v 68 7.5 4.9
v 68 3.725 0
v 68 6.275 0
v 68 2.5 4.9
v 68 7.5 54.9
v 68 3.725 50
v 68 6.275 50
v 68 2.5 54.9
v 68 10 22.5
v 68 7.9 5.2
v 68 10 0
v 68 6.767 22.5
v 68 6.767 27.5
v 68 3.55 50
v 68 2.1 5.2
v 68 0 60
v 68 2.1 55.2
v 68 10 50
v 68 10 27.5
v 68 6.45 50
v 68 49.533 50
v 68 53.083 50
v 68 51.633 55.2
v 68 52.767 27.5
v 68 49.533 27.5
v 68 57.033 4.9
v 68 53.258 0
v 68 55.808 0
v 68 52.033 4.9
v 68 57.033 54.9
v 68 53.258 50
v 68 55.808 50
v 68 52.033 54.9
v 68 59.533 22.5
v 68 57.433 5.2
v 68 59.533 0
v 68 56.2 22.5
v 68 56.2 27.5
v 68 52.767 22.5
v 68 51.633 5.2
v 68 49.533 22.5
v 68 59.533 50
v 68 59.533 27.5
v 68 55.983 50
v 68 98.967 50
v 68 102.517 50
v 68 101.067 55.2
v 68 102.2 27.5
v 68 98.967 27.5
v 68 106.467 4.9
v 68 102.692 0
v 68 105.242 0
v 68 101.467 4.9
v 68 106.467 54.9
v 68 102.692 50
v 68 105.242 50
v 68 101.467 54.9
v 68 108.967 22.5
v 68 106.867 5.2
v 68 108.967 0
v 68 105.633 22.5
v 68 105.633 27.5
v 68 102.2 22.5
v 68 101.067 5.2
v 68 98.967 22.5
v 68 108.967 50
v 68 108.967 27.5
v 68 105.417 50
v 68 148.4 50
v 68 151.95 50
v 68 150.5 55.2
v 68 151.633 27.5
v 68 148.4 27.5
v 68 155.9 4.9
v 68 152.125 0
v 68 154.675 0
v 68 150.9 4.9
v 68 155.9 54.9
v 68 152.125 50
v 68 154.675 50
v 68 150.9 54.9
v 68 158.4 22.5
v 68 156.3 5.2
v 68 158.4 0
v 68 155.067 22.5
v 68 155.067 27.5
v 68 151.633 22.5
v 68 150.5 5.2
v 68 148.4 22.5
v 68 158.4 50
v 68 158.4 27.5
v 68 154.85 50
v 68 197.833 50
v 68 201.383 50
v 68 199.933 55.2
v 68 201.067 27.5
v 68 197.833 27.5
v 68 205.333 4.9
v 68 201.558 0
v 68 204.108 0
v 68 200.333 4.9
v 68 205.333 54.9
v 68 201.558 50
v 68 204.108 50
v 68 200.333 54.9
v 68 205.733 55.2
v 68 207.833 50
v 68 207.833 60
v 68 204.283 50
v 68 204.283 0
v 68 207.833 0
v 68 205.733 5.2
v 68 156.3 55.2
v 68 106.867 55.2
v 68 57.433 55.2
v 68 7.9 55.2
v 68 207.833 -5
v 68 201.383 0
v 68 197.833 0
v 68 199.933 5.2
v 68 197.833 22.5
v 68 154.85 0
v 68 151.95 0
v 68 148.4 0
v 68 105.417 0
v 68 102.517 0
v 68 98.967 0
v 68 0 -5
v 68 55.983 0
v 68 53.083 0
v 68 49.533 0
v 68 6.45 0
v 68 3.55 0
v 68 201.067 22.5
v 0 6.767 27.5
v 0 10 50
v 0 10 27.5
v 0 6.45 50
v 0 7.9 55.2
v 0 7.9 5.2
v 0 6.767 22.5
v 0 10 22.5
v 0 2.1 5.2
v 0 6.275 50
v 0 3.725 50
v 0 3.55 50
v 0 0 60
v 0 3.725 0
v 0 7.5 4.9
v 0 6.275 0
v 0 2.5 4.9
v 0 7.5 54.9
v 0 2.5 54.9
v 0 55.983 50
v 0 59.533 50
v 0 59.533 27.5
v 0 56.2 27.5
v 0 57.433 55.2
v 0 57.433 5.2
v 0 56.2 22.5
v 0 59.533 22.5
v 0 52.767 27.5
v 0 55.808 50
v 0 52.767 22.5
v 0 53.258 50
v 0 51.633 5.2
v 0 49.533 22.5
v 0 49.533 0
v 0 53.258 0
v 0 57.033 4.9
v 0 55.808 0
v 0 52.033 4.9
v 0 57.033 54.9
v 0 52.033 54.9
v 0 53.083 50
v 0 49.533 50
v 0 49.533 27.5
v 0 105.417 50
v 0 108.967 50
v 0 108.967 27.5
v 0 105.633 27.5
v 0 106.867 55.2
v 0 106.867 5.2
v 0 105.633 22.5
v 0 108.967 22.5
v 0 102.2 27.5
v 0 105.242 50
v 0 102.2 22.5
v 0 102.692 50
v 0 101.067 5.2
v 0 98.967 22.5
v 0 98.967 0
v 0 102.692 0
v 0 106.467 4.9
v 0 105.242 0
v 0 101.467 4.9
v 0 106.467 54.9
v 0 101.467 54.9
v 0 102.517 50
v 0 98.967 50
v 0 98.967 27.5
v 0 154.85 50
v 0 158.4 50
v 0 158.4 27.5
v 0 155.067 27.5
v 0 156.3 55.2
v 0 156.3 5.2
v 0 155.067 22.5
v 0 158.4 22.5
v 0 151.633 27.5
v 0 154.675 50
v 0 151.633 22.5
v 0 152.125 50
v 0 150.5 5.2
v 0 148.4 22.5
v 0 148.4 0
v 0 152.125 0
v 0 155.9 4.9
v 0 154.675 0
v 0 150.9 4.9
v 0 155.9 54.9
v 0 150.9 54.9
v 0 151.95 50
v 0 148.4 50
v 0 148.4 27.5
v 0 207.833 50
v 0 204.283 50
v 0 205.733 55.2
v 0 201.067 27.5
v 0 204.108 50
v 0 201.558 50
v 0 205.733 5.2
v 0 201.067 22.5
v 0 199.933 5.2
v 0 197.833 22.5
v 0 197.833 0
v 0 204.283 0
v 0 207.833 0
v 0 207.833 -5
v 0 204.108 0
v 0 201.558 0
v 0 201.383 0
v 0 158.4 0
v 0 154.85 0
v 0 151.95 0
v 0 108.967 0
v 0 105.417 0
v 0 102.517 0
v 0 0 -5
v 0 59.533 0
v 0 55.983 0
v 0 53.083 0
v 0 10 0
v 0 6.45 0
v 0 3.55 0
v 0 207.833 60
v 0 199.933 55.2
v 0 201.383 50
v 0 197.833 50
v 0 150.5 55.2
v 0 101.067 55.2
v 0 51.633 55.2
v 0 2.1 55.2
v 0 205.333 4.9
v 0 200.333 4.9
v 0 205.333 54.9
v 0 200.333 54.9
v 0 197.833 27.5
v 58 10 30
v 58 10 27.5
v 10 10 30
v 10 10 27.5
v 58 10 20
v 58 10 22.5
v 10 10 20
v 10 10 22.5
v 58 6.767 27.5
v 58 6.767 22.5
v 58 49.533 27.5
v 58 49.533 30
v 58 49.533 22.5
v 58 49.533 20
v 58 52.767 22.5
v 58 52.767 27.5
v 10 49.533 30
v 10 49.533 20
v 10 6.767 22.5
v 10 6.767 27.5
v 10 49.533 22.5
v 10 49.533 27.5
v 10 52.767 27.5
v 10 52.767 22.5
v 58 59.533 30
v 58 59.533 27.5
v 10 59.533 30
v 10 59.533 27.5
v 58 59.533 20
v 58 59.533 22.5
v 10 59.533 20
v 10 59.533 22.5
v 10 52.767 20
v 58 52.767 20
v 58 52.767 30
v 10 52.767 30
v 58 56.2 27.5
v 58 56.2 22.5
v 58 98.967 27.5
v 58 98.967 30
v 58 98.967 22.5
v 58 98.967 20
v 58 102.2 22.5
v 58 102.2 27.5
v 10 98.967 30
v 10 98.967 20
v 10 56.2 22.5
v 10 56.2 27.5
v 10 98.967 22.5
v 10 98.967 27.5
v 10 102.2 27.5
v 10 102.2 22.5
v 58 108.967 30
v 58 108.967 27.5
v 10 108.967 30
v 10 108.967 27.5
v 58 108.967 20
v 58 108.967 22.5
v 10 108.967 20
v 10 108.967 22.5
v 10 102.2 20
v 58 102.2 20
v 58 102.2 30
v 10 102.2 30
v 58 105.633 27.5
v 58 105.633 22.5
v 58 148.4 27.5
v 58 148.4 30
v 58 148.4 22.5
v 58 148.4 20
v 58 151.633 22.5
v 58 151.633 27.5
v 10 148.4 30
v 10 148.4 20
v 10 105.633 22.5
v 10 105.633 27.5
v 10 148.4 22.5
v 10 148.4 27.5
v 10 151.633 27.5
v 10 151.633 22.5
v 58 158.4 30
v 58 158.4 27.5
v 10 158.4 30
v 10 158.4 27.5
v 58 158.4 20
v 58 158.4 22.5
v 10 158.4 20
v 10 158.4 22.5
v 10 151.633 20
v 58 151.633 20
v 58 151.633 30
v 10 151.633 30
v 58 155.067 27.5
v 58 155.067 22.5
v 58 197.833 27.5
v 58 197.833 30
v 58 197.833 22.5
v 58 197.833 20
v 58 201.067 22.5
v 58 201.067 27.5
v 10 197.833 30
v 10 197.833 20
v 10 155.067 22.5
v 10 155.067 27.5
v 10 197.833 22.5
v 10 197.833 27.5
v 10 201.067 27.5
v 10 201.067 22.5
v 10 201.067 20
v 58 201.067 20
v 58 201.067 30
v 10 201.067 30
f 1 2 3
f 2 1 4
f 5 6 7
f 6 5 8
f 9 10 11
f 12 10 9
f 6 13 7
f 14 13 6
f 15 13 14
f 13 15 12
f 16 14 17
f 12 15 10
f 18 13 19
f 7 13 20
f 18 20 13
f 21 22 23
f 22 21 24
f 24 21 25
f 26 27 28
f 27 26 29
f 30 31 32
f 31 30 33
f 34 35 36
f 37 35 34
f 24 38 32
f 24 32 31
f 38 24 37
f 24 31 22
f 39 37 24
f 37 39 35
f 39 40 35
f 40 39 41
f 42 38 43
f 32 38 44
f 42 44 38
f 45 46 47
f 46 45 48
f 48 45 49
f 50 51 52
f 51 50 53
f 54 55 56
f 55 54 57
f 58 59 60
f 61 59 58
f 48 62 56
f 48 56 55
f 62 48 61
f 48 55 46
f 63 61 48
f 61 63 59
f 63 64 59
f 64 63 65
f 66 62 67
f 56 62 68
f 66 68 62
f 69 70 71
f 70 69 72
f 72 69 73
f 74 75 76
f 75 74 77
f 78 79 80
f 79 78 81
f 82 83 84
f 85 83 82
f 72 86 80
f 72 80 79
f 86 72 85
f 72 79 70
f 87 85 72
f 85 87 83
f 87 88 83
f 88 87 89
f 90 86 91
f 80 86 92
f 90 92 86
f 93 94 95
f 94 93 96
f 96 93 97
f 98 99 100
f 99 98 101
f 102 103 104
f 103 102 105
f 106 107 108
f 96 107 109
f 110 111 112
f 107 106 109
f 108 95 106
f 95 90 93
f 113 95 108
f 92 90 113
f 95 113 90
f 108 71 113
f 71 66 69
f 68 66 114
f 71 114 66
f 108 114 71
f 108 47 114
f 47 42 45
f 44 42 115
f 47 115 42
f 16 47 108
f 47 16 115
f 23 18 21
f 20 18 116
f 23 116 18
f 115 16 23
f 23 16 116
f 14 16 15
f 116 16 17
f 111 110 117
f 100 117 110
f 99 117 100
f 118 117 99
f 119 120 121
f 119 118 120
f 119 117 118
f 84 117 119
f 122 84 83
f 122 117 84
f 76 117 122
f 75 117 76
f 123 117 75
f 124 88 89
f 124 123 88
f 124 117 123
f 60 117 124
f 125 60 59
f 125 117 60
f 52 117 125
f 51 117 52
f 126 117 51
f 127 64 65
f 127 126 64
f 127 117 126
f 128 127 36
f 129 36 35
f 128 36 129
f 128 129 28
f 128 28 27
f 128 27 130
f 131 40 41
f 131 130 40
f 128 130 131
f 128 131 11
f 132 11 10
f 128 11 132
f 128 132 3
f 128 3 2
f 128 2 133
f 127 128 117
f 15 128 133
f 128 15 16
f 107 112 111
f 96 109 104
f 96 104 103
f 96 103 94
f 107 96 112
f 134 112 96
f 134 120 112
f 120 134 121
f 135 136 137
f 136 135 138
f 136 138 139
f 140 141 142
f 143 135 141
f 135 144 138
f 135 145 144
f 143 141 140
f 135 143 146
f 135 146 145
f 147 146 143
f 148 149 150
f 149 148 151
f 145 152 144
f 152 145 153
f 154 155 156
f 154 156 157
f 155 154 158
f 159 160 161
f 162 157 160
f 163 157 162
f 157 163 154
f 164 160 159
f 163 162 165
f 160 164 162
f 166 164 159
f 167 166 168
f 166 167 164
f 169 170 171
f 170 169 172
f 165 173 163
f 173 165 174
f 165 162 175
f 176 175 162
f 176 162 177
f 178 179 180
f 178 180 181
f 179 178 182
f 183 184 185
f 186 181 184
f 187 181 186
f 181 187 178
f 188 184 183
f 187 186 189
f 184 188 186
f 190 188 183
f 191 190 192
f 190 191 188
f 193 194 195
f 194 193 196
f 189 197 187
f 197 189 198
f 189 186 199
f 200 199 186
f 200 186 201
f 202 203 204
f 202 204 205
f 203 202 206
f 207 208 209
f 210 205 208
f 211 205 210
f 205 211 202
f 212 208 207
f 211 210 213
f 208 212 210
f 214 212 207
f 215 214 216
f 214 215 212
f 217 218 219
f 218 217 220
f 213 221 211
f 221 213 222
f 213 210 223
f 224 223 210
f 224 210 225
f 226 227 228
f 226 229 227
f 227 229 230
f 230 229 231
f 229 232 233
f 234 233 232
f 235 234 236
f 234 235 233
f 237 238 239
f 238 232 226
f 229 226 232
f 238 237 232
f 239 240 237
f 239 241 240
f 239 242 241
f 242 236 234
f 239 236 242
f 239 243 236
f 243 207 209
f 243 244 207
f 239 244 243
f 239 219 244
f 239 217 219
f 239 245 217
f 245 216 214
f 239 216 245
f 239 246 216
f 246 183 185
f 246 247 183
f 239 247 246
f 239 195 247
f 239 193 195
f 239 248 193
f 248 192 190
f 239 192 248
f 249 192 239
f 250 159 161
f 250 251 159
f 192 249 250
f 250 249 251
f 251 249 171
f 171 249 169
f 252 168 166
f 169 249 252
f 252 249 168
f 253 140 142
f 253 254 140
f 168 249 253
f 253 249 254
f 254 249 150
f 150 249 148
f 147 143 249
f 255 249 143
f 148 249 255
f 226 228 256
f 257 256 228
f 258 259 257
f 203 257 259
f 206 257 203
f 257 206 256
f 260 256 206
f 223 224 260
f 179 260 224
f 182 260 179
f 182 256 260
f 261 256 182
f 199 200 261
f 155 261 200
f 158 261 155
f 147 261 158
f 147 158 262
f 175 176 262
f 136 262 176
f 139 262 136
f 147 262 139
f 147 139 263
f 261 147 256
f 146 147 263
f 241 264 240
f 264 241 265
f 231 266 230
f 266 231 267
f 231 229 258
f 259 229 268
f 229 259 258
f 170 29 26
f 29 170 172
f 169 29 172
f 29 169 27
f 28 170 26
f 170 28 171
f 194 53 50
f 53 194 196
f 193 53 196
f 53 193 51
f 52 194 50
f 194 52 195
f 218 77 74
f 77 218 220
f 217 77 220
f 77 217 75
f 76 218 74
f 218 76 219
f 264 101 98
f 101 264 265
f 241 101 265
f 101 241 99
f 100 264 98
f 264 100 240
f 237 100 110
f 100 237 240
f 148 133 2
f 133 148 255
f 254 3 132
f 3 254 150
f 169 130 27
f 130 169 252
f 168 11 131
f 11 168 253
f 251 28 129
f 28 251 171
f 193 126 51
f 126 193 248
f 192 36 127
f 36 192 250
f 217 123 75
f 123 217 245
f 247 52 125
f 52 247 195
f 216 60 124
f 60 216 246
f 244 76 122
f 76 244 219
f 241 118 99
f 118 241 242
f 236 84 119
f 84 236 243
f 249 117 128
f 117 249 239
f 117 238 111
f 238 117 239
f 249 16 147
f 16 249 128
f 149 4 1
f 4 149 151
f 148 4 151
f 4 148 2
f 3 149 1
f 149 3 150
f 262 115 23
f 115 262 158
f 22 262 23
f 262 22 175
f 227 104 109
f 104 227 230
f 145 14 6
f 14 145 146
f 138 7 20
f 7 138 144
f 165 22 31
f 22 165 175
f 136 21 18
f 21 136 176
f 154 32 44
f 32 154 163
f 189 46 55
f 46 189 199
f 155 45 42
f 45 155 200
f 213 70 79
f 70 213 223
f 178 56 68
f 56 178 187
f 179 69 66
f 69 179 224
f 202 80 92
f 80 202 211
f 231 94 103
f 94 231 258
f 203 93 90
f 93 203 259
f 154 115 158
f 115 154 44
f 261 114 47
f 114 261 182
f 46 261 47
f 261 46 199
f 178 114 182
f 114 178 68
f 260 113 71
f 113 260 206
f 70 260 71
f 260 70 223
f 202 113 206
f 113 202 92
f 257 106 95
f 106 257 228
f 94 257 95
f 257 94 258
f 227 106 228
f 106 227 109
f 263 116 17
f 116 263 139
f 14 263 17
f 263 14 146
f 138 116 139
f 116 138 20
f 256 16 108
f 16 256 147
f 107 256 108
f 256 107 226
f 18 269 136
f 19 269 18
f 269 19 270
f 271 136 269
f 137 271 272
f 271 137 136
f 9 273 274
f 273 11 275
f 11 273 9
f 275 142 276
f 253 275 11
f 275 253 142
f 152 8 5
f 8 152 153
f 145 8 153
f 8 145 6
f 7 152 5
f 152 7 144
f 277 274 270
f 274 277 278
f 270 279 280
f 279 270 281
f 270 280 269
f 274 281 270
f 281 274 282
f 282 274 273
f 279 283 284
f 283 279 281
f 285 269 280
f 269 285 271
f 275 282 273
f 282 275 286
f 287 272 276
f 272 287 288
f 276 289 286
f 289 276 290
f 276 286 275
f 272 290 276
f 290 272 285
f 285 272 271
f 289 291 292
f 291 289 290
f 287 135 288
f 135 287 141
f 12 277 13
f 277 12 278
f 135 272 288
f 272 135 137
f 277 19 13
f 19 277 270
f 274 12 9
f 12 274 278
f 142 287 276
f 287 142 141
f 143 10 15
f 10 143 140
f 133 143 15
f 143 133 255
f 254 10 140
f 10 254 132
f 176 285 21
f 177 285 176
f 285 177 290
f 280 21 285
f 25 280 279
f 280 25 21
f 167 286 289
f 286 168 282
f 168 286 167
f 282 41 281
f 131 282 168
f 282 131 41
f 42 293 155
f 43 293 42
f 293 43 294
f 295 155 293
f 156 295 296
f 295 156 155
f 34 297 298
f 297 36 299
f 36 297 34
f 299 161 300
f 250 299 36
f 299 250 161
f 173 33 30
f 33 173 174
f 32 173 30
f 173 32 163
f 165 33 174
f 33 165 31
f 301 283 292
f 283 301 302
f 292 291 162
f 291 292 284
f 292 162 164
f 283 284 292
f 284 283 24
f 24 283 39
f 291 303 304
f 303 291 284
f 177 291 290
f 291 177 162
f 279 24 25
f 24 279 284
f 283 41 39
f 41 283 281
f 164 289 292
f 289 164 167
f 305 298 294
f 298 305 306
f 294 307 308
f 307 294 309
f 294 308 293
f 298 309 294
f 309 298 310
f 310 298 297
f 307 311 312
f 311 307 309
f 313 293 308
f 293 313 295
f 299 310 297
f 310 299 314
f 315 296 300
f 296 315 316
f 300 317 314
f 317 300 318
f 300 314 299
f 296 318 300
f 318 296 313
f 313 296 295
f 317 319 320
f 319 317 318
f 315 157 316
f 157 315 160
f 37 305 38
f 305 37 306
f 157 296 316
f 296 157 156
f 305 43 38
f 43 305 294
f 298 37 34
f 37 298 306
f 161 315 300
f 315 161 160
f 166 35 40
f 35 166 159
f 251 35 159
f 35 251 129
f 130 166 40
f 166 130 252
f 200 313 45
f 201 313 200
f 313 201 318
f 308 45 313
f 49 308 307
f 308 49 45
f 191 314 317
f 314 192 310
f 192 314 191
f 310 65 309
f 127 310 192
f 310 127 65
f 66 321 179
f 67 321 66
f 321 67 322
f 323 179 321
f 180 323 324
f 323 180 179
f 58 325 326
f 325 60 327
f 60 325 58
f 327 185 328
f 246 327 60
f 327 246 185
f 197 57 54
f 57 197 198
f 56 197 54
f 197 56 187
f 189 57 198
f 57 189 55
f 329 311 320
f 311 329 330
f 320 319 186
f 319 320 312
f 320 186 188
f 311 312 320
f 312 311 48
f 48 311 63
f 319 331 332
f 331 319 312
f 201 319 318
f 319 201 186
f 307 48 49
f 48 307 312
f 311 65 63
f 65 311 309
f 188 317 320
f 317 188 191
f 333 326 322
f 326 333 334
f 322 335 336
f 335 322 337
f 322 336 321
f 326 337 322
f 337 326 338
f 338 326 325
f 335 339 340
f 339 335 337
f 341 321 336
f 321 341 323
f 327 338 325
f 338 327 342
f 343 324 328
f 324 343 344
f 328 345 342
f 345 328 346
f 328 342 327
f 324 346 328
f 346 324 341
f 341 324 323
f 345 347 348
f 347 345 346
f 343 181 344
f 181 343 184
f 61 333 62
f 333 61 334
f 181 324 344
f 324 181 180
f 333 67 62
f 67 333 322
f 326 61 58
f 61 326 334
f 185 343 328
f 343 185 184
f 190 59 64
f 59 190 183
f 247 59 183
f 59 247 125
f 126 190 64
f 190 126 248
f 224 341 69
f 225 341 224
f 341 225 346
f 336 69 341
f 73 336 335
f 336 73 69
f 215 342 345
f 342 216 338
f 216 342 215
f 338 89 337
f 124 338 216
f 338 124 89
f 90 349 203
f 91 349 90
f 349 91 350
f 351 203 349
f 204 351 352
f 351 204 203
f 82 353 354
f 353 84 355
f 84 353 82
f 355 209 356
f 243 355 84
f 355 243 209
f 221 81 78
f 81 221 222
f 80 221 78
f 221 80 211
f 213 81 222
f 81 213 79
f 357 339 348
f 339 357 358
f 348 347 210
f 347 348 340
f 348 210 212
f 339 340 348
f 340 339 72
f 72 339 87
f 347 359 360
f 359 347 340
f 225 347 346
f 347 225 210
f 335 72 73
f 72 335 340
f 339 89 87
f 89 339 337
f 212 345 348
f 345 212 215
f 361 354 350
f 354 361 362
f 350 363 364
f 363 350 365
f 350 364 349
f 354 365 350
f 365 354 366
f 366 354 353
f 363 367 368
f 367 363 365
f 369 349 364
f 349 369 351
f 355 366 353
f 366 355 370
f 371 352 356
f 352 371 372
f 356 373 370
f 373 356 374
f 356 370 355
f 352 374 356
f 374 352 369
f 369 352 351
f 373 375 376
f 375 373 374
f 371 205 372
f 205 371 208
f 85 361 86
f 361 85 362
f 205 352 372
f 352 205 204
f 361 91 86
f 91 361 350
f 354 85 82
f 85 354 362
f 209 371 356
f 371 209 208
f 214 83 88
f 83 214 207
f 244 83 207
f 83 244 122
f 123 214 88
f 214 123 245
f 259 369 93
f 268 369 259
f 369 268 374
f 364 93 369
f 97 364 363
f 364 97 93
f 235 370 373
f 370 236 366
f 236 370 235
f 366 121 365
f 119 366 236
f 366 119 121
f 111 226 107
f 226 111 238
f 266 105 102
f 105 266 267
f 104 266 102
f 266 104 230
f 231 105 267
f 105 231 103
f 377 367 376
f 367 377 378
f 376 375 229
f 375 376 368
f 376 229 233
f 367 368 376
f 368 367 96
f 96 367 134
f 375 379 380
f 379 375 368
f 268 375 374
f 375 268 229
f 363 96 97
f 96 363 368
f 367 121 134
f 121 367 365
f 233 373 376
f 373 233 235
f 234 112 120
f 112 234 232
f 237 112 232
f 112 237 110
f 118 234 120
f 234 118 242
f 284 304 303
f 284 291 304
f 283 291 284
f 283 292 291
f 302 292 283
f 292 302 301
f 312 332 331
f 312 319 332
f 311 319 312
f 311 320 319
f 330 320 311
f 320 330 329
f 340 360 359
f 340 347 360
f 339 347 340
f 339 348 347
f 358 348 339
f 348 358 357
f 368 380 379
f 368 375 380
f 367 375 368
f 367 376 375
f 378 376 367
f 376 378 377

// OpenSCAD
/**************************************************************************** 
Title: Orange Pi Zero Plus Stack Mounting System

Description: This script is intended to generate a stackable mounting system for the Orange Pi Zero Plus.

Author: Ross MacDonald
Created In: 2018-05-09 

License: Attribution-NonCommercial-ShareAlike 4.0 International (CC BY-NC-SA 4.0)
License Link: https://creativecommons.org/licenses/by-nc-sa/4.0/

/***************************************************************************/

// ##########################################################################
// Modify these variables to define what to generate

// What part to generate: Values: "wall", "top", "bottom", "demo"
generateType = "demo";

// Wall notch characteristics: 0, 1, or 2
number_of_wall_notches = 1;

// Horizontal Unit Count: This affects only the top and bottom generation
// If set to 1, then the top and bottom will generate at one board unit wide
// If, instead, the user would like to place more that one board beside one another,
// then set to a number equal to the number of horizontally adjacent boards desired
number_of_horizontal_units = 4;
// ##########################################################################

// The following board variables could be adjusted to suit other board types
board_depth = 48;
board_width = 46;
board_thickness = 10;
board_headroom = 20;

// These variables configure the wall characteristics
wall_thickness = 10;
wall_depthroom = 10;
wall_depth = board_depth + (wall_depthroom * 2);
wall_height = board_thickness + (board_headroom * 2);

// These variables define the interlocking dovetail dimensons
interlock_i_depth = wall_depth;
interlock_i_width = (wall_thickness / 2);
interlock_i_thickness = 5;

// Some slack is needed to ensure there is some play in fitting parts
// If the dovetail slides are too tight, increase the interlock slack
// If the dovetail slides are too loose, decrease the interlock slack
interlock_i_slack = 0.4;
overlap_fudge = 0.1;

// This defines how much of a notch is created in the wall for the board to rest on
// The logic below is simple, do not make the notch too large, otherwise the wall 
// will fall apart!
board_notch_offset = wall_thickness * 2/3;

// These variables define the top and bottom characteristics
bridge_depth = wall_depth;
bridge_width = board_width + (2 * board_notch_offset) + (2 * overlap_fudge);
bridge_thickness = 5;

overall_bridge_width = bridge_width + ((number_of_horizontal_units-1) * (bridge_width - (wall_depthroom + overlap_fudge)));

function getInterlockTranslation(i) =
    ((bridge_width * i) - (wall_thickness * 3/4) - ((i-1) * (wall_depthroom + overlap_fudge)));

// This is a module used to generate a dovetail interlocking segment
module generateDovetail(depth, width, thickness) {
    dovetailIndent = width / 4;
    linear_extrude(height = depth) {
        polygon([[0, dovetailIndent], [0, width-dovetailIndent], 
            [thickness, width], [thickness,0]]);
    }    
}

module generateInterlock(type) {
    if(type == "innie") {
        generateDovetail(interlock_i_depth, 
            interlock_i_width + (interlock_i_slack * 2), 
            interlock_i_thickness + interlock_i_slack / 2);
    }
    else if(type == "outtie") {
        generateDovetail(interlock_i_depth, 
            interlock_i_width, 
            interlock_i_thickness);
    }
}
    
// This module generates a wall
module generateWall(numberOfNotches) {
    difference() {
        difference() {
            union() {
                cube([wall_depth, wall_thickness, wall_height]);
                
                rotate([0,-90,0]){
                    translate([wall_height - overlap_fudge,
                    (wall_thickness/4),-interlock_i_depth]){    
                        generateInterlock("outtie");
                    }
                }    
            }

            union(){
                if(numberOfNotches > 0.5) {
                    translate([wall_depthroom,
                    board_notch_offset+overlap_fudge,
                    board_headroom]){
                        cube([board_depth,
                            wall_thickness-board_notch_offset,
                            board_thickness]);
                    }
                    
                    translate([0,
                    board_notch_offset+overlap_fudge,
                    (board_headroom + (board_thickness / 4))]) {
                        cube([wall_depth,
                            wall_thickness-board_notch_offset,
                            (board_thickness / 2)]);
                    }
                }
                
                if(numberOfNotches > 1.5) {
                    translate([wall_depthroom, 0,
                    board_headroom]){
                        cube([board_depth,
                            wall_thickness-board_notch_offset,
                            board_thickness]);
                    }
                    
                    translate([0, 0,
                    (board_headroom + (board_thickness / 4))]) {
                        cube([wall_depth,
                            wall_thickness-board_notch_offset,
                            (board_thickness / 2)]);
                    }
                }
                
            }                
        }

        rotate([0,-90,0]){
            translate([0,(wall_thickness/4) - interlock_i_slack,
            -interlock_i_depth]){    
                generateInterlock("innie");
            }
        }
    }
}  

// Create a basic bridge
module generateBridge(thickness) {
    cube([bridge_depth, overall_bridge_width, thickness]);    
}

// This module generates the bottom for the unit
module generateBottomBridge() {
    union() {
        generateBridge(bridge_thickness);
        
        rotate([0,-90,0]){
            translate([(bridge_thickness - overlap_fudge),
            (wall_thickness/4),-interlock_i_depth]){    
                generateInterlock("outtie");
            }
        }
        
        for(i = [1:number_of_horizontal_units]){
            rotate([0,-90,0]){
                translate([(bridge_thickness - overlap_fudge),
                    getInterlockTranslation(i),
                    -interlock_i_depth]){    
                    generateInterlock("outtie");
                }
            }
        }
    }
}

// This module generates the top for the unit
module generateTopBridge() {
    difference() {
        generateBridge(2 * bridge_thickness);
        
        union() {
            rotate([0,-90,0]){
                translate([0, 
                    ((wall_thickness/4) - interlock_i_slack), 
                    -interlock_i_depth]){    
                    generateInterlock("innie");
                }
            }
            
            for(i = [1:number_of_horizontal_units]){
                rotate([0,-90,0]){
                    translate([0,
                        getInterlockTranslation(i) - interlock_i_slack,
                        -interlock_i_depth]){    
                        generateInterlock("innie");
                    }
                }
            }
        }        
    }
}

// This generates a demonstration of constructed system
module demo() {
    translate([0,0,-bridge_thickness])generateBottomBridge();
    translate([0,0,50])generateTopBridge();
    generateWall(1);
    for(i = [1:(number_of_horizontal_units)]){
        translate([0,
            (bridge_width * i) - ((i-1) * (wall_depthroom+overlap_fudge)),
            0])mirror([0,1,0]){
                generateWall(i == number_of_horizontal_units ? 1 : 2);
            }
            
        color("powderblue",0.5)translate([wall_depthroom, 
            board_notch_offset + overlap_fudge + (i-1) * (wall_thickness - board_notch_offset + overlap_fudge + board_width),
            board_headroom])cube([board_depth,board_width,board_thickness]);
    }
}

if (generateType == "demo"){
    demo();
}
else if(generateType == "wall") {
    rotate([0,-90,0]){
        generateWall(number_of_wall_notches);
    }
}
else if(generateType == "top") {
    rotate([0,-90,0]){
        generateTopBridge();
    }
}
else if(generateType == "bottom") {
    rotate([0,-90,0]){
        generateBottomBridge();
    }   
}
